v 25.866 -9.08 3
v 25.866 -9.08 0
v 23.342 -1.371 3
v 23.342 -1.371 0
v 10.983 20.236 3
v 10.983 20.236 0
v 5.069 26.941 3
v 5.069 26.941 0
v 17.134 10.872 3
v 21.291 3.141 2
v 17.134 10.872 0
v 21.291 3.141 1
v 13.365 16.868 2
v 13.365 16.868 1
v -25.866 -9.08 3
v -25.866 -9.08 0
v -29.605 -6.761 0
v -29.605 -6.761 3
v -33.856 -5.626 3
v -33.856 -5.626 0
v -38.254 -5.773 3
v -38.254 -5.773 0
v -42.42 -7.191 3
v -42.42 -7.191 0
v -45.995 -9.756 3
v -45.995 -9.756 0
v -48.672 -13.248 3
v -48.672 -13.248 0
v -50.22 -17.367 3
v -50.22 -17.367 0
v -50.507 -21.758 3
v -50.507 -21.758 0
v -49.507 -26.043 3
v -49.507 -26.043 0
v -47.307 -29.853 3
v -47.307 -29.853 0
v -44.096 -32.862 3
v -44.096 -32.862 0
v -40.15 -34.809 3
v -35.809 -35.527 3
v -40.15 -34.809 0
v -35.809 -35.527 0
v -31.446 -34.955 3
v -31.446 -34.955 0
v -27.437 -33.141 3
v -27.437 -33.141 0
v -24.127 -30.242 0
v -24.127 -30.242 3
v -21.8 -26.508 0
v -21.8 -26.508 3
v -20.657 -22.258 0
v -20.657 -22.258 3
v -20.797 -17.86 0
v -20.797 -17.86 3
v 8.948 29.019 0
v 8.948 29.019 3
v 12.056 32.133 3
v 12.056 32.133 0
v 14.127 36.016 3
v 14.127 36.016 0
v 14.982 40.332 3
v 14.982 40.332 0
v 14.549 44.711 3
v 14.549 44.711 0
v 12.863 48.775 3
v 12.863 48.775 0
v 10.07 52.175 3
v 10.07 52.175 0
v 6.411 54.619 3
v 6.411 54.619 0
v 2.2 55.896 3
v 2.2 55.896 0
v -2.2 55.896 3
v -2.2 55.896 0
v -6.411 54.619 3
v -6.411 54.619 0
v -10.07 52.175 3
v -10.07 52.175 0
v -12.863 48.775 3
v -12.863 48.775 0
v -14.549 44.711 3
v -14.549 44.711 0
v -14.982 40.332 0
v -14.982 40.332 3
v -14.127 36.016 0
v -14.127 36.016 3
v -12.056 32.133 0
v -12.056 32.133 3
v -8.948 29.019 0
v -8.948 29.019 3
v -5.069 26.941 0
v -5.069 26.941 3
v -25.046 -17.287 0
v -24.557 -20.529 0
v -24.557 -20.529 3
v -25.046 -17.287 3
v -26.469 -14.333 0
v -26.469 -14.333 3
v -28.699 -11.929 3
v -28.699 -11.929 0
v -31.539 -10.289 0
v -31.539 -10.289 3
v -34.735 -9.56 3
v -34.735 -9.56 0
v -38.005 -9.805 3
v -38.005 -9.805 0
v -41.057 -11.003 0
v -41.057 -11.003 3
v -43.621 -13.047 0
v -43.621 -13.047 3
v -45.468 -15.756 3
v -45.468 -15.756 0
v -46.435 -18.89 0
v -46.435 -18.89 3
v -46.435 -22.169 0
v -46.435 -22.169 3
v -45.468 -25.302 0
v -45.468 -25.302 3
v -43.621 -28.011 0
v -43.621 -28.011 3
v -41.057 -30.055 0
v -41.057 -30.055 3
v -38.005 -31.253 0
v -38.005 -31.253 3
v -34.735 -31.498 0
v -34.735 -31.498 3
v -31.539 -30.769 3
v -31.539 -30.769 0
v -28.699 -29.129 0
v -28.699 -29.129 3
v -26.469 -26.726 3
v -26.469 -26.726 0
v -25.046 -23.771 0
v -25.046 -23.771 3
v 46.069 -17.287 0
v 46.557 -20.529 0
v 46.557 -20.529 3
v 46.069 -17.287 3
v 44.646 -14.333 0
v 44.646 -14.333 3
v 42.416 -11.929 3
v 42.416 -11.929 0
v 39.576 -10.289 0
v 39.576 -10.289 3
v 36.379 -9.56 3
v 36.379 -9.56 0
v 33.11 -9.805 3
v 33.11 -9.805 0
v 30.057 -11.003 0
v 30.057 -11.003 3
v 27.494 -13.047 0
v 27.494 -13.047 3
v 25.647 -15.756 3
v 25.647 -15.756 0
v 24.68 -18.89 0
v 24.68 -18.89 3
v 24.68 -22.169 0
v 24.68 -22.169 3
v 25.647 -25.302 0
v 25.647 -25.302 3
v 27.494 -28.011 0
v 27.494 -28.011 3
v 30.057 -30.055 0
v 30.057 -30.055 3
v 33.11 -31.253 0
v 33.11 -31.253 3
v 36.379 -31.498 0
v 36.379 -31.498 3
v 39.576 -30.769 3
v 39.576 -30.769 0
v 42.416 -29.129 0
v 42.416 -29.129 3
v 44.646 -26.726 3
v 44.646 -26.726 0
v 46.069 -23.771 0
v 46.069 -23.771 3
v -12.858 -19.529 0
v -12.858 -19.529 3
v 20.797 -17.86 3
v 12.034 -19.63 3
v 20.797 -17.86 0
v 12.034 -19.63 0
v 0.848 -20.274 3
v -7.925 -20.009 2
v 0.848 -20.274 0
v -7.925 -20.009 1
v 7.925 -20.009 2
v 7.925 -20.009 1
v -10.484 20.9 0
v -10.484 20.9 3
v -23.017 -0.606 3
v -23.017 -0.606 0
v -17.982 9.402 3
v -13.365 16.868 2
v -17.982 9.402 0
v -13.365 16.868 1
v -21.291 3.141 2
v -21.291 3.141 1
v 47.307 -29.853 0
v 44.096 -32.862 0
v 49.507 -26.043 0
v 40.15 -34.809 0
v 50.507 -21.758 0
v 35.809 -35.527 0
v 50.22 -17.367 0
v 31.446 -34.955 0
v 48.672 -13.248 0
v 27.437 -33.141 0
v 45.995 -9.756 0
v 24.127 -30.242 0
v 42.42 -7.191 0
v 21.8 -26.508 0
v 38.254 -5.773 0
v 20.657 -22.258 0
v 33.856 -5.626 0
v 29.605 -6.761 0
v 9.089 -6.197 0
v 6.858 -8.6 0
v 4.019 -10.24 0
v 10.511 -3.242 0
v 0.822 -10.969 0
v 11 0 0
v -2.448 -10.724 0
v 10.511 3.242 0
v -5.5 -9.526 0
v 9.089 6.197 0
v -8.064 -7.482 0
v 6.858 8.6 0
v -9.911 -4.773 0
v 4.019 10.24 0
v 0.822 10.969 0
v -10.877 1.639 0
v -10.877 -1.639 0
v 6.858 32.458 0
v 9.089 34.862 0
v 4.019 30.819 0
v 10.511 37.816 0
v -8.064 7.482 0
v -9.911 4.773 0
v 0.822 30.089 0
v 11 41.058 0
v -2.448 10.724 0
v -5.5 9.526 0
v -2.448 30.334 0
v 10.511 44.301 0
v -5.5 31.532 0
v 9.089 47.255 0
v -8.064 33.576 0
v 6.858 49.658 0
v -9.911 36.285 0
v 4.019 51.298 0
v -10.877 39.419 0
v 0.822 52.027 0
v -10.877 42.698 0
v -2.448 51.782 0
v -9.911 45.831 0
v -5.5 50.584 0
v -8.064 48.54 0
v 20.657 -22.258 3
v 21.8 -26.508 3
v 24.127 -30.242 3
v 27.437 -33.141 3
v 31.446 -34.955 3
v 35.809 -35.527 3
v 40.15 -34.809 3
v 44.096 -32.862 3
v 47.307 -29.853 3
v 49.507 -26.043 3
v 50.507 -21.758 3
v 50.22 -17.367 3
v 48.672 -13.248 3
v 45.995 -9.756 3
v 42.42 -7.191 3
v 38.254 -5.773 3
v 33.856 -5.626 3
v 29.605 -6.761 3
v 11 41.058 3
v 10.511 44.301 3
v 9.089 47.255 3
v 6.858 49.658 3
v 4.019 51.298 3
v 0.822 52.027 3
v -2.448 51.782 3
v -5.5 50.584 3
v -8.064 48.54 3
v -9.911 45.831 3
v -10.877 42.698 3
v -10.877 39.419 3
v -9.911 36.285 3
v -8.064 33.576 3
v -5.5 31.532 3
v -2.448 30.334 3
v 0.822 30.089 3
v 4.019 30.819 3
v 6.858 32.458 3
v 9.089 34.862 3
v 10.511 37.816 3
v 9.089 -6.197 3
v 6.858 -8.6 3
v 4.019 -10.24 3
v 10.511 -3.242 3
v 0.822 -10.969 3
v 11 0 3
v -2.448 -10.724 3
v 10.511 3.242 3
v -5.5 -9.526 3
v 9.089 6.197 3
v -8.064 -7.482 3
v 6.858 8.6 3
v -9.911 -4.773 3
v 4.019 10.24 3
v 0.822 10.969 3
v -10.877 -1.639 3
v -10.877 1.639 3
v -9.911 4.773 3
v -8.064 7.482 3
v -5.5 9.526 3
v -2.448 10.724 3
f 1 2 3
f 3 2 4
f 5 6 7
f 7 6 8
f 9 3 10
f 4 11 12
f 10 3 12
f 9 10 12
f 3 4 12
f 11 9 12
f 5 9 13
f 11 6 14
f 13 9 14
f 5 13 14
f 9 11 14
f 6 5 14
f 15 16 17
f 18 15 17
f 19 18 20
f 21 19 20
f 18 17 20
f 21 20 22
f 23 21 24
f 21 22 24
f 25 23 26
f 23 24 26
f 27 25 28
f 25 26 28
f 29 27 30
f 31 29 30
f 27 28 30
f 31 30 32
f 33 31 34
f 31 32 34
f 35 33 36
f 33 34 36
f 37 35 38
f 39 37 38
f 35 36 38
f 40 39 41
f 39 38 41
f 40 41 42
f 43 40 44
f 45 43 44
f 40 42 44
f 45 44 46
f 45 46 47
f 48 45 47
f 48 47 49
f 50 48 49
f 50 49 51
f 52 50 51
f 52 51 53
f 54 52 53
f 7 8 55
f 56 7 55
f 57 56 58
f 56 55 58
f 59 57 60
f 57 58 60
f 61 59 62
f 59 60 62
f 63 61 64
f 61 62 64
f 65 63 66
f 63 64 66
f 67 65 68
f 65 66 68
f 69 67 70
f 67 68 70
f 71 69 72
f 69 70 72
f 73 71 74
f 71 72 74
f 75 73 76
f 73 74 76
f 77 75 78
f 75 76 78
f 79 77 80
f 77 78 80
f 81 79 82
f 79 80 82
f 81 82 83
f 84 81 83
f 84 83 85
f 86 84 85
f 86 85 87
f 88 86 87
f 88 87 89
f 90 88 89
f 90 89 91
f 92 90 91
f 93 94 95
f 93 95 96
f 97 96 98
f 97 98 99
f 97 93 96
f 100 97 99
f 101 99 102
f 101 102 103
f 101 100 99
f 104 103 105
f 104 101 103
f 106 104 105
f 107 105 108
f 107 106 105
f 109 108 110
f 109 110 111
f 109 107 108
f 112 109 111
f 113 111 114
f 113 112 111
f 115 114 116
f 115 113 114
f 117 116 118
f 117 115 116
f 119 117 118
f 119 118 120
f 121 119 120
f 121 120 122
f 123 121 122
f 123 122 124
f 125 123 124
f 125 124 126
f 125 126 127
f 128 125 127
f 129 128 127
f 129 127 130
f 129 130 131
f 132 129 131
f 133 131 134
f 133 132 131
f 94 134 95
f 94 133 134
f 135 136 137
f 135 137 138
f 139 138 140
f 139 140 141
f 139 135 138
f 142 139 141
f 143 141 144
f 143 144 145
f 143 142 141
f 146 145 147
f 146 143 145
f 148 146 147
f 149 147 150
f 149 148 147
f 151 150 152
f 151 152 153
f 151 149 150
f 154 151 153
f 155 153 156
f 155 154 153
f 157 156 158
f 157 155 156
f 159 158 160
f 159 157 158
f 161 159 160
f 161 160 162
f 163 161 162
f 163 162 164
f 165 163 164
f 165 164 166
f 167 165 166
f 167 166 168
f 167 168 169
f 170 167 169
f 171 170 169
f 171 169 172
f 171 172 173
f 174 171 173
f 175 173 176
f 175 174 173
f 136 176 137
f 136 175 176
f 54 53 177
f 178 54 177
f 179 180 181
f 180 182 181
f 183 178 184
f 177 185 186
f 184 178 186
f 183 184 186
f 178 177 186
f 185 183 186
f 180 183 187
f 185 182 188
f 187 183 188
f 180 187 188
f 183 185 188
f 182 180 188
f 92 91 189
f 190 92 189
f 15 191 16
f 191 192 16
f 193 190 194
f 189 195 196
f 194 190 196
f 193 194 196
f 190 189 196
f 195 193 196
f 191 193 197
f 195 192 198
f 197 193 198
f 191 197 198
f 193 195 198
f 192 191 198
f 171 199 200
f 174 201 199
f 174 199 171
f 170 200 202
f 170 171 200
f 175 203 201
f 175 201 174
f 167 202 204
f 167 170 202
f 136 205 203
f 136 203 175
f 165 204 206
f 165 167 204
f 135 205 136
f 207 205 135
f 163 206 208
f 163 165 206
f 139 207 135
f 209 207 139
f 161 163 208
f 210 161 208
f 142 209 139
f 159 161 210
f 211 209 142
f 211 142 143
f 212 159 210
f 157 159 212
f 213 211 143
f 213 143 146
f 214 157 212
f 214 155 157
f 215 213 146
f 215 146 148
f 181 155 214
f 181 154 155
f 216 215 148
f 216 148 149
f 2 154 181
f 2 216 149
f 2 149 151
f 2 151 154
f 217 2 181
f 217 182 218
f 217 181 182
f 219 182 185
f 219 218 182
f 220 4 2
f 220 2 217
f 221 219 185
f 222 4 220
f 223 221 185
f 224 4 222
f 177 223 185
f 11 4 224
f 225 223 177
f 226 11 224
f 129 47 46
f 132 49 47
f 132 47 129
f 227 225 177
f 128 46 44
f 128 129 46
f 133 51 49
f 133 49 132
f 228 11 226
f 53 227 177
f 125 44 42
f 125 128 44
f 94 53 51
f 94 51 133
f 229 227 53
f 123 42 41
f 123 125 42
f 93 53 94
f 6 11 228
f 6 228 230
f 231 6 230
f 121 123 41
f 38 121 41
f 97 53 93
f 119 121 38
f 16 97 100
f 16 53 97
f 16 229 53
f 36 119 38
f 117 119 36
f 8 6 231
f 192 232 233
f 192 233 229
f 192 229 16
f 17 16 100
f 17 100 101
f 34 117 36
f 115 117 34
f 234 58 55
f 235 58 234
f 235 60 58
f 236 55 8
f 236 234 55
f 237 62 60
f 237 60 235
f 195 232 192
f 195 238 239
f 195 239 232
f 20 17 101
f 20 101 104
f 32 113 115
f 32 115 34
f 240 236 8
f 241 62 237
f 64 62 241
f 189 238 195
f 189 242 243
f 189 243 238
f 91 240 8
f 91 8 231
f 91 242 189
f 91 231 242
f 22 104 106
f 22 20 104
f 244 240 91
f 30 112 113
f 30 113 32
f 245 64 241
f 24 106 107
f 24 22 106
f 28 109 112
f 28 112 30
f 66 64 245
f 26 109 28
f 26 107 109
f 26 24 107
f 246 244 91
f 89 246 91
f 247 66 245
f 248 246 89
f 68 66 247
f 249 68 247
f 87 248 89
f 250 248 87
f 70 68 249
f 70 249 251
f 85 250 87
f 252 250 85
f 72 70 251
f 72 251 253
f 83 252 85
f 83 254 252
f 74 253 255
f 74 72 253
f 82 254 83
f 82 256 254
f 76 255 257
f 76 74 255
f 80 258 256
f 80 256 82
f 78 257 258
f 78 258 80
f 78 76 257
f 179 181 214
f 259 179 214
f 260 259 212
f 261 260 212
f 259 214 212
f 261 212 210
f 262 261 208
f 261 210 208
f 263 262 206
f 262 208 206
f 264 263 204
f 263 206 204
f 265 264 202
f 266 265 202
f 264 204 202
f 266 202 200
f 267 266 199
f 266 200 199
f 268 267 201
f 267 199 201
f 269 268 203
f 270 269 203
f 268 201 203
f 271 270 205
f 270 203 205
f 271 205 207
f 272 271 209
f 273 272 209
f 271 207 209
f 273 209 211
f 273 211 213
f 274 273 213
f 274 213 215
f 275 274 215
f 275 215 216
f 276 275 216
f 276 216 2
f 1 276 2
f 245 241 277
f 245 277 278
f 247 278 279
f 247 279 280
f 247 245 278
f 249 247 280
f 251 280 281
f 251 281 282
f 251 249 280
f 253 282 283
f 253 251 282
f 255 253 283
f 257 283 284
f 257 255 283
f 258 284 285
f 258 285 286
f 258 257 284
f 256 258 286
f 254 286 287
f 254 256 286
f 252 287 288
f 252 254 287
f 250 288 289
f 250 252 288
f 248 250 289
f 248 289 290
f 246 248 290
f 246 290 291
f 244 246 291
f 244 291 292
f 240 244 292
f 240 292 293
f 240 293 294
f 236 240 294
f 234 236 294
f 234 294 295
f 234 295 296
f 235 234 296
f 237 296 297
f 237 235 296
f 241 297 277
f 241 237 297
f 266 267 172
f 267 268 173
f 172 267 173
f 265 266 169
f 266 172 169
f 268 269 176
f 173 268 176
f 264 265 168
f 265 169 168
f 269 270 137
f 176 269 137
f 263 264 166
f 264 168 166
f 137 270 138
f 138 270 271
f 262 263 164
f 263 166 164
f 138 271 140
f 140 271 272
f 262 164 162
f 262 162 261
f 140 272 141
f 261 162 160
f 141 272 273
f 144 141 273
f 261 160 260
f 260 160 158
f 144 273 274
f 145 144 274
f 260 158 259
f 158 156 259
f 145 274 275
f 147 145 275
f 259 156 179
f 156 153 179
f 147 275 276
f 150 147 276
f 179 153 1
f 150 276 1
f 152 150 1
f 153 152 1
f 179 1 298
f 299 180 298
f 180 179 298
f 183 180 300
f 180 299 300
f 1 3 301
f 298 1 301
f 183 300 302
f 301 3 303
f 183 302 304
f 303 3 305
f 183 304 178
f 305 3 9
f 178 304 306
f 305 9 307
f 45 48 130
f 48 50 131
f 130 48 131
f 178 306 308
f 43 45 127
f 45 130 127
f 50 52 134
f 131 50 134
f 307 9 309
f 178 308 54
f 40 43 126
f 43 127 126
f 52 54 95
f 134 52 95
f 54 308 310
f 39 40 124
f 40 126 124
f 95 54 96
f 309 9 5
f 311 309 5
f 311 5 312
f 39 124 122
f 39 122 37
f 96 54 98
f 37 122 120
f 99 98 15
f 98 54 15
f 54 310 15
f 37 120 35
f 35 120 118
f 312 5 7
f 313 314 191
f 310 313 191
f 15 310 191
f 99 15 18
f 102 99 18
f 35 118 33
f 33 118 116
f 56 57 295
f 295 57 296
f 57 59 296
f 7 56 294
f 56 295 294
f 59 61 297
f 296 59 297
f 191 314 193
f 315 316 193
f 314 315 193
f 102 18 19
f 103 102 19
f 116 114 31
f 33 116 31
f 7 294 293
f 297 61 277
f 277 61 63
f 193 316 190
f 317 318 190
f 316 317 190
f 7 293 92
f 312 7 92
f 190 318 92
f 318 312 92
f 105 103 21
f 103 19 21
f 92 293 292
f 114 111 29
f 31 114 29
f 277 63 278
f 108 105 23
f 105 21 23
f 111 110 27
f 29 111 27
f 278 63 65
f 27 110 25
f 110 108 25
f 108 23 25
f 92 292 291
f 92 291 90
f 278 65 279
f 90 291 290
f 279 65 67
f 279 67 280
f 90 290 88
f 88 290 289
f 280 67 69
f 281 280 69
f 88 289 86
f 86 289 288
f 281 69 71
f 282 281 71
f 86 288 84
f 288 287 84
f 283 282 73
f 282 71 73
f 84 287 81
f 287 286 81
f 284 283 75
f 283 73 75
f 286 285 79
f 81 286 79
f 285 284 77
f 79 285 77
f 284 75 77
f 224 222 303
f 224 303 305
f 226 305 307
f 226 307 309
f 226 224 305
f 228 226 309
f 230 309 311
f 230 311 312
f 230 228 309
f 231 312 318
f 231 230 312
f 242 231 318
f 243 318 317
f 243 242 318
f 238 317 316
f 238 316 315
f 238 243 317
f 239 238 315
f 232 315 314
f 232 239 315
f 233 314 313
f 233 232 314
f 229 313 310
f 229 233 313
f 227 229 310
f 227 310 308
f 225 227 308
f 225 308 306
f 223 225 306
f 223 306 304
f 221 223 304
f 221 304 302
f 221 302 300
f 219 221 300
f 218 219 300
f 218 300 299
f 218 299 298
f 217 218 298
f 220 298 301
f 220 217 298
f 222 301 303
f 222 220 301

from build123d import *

# Parameters (mm, degrees)
F0_R     = 11
F1_DEPTH = 3


with BuildPart() as f1:
    # F0 (on Top) → F1 (new body)
    with BuildSketch(Plane.XY):
        with BuildLine():
            add(Edge.make_bspline(
                [(5.0692520794, 26.9407597389), (1.3719432198, 30.1629827921), (-1.3719432198, 30.1629827921), (-5.0692520794, 26.9407597389)],
                knots=[0.8898242879, 0.8898242879, 0.8898242879, 0.8898242879, 1, 1, 1, 1], degree=3))
            ThreePointArc((5.0692520794, 26.9407597389), (0, 56.0582199693), (-5.0692520794, 26.9407597389))
        make_face()
        with Locations((0, 41.0582199693)):
            Circle(F0_R, mode=Mode.SUBTRACT)
        with BuildLine():
            add(Edge.make_bspline(
                [(25.8660083708, -9.0802787905), (23.9582735086, 0.6684610246), (12.5580409831, 20.414242977), (5.0692520794, 26.9407597389)],
                knots=[0.6666666667, 0.6666666667, 0.6666666667, 0.6666666667, 0.8898242879, 0.8898242879, 0.8898242879, 0.8898242879], degree=3))
            add(Edge.make_bspline(
                [(5.0692520794, 26.9407597389), (1.3719432198, 30.1629827921), (-1.3719432198, 30.1629827921), (-5.0692520794, 26.9407597389)],
                knots=[0.8898242879, 0.8898242879, 0.8898242879, 0.8898242879, 1, 1, 1, 1], degree=3))
            add(Edge.make_bspline(
                [(-5.0692520794, 26.9407597389), (-12.5580409831, 20.414242977), (-23.9582735086, 0.6684610246), (-25.8660083708, -9.0802787905)],
                knots=[0, 0, 0, 0, 0.2231576212, 0.2231576212, 0.2231576212, 0.2231576212], degree=3))
            add(Edge.make_bspline(
                [(-25.8660083708, -9.0802787905), (-26.8078809618, -13.8933537152), (-25.435937742, -16.2696290769), (-20.7967562915, -17.8604809484)],
                knots=[0.2231576212, 0.2231576212, 0.2231576212, 0.2231576212, 0.3333333333, 0.3333333333, 0.3333333333, 0.3333333333], degree=3))
            add(Edge.make_bspline(
                [(-20.7967562915, -17.8604809484), (-11.4002325256, -21.0827040016), (11.4002325256, -21.0827040016), (20.7967562915, -17.8604809484)],
                knots=[0.3333333333, 0.3333333333, 0.3333333333, 0.3333333333, 0.5564909546, 0.5564909546, 0.5564909546, 0.5564909546], degree=3))
            add(Edge.make_bspline(
                [(20.7967562915, -17.8604809484), (25.435937742, -16.2696290769), (26.8078809618, -13.8933537152), (25.8660083708, -9.0802787905)],
                knots=[0.5564909546, 0.5564909546, 0.5564909546, 0.5564909546, 0.6666666667, 0.6666666667, 0.6666666667, 0.6666666667], degree=3))
        make_face()
        Circle(F0_R, mode=Mode.SUBTRACT)
        with BuildLine():
            ThreePointArc((20.7967562915, -17.8604809484), (48.5478425843, -28.0291099846), (25.8660083708, -9.0802787905))
            add(Edge.make_bspline(
                [(20.7967562915, -17.8604809484), (25.435937742, -16.2696290769), (26.8078809618, -13.8933537152), (25.8660083708, -9.0802787905)],
                knots=[0.5564909546, 0.5564909546, 0.5564909546, 0.5564909546, 0.6666666667, 0.6666666667, 0.6666666667, 0.6666666667], degree=3))
        make_face()
        with Locations((35.5574615276, -20.5291099846)):
            Circle(F0_R, mode=Mode.SUBTRACT)
        with BuildLine():
            add(Edge.make_bspline(
                [(-25.8660083708, -9.0802787905), (-26.8078809618, -13.8933537152), (-25.435937742, -16.2696290769), (-20.7967562915, -17.8604809484)],
                knots=[0.2231576212, 0.2231576212, 0.2231576212, 0.2231576212, 0.3333333333, 0.3333333333, 0.3333333333, 0.3333333333], degree=3))
            ThreePointArc((-25.8660083708, -9.0802787905), (-48.5478425843, -28.0291099846), (-20.7967562915, -17.8604809484))
        make_face()
        with Locations((-35.5574615276, -20.5291099846)):
            Circle(F0_R, mode=Mode.SUBTRACT)
    extrude(amount=F1_DEPTH)


solid = f1.part
